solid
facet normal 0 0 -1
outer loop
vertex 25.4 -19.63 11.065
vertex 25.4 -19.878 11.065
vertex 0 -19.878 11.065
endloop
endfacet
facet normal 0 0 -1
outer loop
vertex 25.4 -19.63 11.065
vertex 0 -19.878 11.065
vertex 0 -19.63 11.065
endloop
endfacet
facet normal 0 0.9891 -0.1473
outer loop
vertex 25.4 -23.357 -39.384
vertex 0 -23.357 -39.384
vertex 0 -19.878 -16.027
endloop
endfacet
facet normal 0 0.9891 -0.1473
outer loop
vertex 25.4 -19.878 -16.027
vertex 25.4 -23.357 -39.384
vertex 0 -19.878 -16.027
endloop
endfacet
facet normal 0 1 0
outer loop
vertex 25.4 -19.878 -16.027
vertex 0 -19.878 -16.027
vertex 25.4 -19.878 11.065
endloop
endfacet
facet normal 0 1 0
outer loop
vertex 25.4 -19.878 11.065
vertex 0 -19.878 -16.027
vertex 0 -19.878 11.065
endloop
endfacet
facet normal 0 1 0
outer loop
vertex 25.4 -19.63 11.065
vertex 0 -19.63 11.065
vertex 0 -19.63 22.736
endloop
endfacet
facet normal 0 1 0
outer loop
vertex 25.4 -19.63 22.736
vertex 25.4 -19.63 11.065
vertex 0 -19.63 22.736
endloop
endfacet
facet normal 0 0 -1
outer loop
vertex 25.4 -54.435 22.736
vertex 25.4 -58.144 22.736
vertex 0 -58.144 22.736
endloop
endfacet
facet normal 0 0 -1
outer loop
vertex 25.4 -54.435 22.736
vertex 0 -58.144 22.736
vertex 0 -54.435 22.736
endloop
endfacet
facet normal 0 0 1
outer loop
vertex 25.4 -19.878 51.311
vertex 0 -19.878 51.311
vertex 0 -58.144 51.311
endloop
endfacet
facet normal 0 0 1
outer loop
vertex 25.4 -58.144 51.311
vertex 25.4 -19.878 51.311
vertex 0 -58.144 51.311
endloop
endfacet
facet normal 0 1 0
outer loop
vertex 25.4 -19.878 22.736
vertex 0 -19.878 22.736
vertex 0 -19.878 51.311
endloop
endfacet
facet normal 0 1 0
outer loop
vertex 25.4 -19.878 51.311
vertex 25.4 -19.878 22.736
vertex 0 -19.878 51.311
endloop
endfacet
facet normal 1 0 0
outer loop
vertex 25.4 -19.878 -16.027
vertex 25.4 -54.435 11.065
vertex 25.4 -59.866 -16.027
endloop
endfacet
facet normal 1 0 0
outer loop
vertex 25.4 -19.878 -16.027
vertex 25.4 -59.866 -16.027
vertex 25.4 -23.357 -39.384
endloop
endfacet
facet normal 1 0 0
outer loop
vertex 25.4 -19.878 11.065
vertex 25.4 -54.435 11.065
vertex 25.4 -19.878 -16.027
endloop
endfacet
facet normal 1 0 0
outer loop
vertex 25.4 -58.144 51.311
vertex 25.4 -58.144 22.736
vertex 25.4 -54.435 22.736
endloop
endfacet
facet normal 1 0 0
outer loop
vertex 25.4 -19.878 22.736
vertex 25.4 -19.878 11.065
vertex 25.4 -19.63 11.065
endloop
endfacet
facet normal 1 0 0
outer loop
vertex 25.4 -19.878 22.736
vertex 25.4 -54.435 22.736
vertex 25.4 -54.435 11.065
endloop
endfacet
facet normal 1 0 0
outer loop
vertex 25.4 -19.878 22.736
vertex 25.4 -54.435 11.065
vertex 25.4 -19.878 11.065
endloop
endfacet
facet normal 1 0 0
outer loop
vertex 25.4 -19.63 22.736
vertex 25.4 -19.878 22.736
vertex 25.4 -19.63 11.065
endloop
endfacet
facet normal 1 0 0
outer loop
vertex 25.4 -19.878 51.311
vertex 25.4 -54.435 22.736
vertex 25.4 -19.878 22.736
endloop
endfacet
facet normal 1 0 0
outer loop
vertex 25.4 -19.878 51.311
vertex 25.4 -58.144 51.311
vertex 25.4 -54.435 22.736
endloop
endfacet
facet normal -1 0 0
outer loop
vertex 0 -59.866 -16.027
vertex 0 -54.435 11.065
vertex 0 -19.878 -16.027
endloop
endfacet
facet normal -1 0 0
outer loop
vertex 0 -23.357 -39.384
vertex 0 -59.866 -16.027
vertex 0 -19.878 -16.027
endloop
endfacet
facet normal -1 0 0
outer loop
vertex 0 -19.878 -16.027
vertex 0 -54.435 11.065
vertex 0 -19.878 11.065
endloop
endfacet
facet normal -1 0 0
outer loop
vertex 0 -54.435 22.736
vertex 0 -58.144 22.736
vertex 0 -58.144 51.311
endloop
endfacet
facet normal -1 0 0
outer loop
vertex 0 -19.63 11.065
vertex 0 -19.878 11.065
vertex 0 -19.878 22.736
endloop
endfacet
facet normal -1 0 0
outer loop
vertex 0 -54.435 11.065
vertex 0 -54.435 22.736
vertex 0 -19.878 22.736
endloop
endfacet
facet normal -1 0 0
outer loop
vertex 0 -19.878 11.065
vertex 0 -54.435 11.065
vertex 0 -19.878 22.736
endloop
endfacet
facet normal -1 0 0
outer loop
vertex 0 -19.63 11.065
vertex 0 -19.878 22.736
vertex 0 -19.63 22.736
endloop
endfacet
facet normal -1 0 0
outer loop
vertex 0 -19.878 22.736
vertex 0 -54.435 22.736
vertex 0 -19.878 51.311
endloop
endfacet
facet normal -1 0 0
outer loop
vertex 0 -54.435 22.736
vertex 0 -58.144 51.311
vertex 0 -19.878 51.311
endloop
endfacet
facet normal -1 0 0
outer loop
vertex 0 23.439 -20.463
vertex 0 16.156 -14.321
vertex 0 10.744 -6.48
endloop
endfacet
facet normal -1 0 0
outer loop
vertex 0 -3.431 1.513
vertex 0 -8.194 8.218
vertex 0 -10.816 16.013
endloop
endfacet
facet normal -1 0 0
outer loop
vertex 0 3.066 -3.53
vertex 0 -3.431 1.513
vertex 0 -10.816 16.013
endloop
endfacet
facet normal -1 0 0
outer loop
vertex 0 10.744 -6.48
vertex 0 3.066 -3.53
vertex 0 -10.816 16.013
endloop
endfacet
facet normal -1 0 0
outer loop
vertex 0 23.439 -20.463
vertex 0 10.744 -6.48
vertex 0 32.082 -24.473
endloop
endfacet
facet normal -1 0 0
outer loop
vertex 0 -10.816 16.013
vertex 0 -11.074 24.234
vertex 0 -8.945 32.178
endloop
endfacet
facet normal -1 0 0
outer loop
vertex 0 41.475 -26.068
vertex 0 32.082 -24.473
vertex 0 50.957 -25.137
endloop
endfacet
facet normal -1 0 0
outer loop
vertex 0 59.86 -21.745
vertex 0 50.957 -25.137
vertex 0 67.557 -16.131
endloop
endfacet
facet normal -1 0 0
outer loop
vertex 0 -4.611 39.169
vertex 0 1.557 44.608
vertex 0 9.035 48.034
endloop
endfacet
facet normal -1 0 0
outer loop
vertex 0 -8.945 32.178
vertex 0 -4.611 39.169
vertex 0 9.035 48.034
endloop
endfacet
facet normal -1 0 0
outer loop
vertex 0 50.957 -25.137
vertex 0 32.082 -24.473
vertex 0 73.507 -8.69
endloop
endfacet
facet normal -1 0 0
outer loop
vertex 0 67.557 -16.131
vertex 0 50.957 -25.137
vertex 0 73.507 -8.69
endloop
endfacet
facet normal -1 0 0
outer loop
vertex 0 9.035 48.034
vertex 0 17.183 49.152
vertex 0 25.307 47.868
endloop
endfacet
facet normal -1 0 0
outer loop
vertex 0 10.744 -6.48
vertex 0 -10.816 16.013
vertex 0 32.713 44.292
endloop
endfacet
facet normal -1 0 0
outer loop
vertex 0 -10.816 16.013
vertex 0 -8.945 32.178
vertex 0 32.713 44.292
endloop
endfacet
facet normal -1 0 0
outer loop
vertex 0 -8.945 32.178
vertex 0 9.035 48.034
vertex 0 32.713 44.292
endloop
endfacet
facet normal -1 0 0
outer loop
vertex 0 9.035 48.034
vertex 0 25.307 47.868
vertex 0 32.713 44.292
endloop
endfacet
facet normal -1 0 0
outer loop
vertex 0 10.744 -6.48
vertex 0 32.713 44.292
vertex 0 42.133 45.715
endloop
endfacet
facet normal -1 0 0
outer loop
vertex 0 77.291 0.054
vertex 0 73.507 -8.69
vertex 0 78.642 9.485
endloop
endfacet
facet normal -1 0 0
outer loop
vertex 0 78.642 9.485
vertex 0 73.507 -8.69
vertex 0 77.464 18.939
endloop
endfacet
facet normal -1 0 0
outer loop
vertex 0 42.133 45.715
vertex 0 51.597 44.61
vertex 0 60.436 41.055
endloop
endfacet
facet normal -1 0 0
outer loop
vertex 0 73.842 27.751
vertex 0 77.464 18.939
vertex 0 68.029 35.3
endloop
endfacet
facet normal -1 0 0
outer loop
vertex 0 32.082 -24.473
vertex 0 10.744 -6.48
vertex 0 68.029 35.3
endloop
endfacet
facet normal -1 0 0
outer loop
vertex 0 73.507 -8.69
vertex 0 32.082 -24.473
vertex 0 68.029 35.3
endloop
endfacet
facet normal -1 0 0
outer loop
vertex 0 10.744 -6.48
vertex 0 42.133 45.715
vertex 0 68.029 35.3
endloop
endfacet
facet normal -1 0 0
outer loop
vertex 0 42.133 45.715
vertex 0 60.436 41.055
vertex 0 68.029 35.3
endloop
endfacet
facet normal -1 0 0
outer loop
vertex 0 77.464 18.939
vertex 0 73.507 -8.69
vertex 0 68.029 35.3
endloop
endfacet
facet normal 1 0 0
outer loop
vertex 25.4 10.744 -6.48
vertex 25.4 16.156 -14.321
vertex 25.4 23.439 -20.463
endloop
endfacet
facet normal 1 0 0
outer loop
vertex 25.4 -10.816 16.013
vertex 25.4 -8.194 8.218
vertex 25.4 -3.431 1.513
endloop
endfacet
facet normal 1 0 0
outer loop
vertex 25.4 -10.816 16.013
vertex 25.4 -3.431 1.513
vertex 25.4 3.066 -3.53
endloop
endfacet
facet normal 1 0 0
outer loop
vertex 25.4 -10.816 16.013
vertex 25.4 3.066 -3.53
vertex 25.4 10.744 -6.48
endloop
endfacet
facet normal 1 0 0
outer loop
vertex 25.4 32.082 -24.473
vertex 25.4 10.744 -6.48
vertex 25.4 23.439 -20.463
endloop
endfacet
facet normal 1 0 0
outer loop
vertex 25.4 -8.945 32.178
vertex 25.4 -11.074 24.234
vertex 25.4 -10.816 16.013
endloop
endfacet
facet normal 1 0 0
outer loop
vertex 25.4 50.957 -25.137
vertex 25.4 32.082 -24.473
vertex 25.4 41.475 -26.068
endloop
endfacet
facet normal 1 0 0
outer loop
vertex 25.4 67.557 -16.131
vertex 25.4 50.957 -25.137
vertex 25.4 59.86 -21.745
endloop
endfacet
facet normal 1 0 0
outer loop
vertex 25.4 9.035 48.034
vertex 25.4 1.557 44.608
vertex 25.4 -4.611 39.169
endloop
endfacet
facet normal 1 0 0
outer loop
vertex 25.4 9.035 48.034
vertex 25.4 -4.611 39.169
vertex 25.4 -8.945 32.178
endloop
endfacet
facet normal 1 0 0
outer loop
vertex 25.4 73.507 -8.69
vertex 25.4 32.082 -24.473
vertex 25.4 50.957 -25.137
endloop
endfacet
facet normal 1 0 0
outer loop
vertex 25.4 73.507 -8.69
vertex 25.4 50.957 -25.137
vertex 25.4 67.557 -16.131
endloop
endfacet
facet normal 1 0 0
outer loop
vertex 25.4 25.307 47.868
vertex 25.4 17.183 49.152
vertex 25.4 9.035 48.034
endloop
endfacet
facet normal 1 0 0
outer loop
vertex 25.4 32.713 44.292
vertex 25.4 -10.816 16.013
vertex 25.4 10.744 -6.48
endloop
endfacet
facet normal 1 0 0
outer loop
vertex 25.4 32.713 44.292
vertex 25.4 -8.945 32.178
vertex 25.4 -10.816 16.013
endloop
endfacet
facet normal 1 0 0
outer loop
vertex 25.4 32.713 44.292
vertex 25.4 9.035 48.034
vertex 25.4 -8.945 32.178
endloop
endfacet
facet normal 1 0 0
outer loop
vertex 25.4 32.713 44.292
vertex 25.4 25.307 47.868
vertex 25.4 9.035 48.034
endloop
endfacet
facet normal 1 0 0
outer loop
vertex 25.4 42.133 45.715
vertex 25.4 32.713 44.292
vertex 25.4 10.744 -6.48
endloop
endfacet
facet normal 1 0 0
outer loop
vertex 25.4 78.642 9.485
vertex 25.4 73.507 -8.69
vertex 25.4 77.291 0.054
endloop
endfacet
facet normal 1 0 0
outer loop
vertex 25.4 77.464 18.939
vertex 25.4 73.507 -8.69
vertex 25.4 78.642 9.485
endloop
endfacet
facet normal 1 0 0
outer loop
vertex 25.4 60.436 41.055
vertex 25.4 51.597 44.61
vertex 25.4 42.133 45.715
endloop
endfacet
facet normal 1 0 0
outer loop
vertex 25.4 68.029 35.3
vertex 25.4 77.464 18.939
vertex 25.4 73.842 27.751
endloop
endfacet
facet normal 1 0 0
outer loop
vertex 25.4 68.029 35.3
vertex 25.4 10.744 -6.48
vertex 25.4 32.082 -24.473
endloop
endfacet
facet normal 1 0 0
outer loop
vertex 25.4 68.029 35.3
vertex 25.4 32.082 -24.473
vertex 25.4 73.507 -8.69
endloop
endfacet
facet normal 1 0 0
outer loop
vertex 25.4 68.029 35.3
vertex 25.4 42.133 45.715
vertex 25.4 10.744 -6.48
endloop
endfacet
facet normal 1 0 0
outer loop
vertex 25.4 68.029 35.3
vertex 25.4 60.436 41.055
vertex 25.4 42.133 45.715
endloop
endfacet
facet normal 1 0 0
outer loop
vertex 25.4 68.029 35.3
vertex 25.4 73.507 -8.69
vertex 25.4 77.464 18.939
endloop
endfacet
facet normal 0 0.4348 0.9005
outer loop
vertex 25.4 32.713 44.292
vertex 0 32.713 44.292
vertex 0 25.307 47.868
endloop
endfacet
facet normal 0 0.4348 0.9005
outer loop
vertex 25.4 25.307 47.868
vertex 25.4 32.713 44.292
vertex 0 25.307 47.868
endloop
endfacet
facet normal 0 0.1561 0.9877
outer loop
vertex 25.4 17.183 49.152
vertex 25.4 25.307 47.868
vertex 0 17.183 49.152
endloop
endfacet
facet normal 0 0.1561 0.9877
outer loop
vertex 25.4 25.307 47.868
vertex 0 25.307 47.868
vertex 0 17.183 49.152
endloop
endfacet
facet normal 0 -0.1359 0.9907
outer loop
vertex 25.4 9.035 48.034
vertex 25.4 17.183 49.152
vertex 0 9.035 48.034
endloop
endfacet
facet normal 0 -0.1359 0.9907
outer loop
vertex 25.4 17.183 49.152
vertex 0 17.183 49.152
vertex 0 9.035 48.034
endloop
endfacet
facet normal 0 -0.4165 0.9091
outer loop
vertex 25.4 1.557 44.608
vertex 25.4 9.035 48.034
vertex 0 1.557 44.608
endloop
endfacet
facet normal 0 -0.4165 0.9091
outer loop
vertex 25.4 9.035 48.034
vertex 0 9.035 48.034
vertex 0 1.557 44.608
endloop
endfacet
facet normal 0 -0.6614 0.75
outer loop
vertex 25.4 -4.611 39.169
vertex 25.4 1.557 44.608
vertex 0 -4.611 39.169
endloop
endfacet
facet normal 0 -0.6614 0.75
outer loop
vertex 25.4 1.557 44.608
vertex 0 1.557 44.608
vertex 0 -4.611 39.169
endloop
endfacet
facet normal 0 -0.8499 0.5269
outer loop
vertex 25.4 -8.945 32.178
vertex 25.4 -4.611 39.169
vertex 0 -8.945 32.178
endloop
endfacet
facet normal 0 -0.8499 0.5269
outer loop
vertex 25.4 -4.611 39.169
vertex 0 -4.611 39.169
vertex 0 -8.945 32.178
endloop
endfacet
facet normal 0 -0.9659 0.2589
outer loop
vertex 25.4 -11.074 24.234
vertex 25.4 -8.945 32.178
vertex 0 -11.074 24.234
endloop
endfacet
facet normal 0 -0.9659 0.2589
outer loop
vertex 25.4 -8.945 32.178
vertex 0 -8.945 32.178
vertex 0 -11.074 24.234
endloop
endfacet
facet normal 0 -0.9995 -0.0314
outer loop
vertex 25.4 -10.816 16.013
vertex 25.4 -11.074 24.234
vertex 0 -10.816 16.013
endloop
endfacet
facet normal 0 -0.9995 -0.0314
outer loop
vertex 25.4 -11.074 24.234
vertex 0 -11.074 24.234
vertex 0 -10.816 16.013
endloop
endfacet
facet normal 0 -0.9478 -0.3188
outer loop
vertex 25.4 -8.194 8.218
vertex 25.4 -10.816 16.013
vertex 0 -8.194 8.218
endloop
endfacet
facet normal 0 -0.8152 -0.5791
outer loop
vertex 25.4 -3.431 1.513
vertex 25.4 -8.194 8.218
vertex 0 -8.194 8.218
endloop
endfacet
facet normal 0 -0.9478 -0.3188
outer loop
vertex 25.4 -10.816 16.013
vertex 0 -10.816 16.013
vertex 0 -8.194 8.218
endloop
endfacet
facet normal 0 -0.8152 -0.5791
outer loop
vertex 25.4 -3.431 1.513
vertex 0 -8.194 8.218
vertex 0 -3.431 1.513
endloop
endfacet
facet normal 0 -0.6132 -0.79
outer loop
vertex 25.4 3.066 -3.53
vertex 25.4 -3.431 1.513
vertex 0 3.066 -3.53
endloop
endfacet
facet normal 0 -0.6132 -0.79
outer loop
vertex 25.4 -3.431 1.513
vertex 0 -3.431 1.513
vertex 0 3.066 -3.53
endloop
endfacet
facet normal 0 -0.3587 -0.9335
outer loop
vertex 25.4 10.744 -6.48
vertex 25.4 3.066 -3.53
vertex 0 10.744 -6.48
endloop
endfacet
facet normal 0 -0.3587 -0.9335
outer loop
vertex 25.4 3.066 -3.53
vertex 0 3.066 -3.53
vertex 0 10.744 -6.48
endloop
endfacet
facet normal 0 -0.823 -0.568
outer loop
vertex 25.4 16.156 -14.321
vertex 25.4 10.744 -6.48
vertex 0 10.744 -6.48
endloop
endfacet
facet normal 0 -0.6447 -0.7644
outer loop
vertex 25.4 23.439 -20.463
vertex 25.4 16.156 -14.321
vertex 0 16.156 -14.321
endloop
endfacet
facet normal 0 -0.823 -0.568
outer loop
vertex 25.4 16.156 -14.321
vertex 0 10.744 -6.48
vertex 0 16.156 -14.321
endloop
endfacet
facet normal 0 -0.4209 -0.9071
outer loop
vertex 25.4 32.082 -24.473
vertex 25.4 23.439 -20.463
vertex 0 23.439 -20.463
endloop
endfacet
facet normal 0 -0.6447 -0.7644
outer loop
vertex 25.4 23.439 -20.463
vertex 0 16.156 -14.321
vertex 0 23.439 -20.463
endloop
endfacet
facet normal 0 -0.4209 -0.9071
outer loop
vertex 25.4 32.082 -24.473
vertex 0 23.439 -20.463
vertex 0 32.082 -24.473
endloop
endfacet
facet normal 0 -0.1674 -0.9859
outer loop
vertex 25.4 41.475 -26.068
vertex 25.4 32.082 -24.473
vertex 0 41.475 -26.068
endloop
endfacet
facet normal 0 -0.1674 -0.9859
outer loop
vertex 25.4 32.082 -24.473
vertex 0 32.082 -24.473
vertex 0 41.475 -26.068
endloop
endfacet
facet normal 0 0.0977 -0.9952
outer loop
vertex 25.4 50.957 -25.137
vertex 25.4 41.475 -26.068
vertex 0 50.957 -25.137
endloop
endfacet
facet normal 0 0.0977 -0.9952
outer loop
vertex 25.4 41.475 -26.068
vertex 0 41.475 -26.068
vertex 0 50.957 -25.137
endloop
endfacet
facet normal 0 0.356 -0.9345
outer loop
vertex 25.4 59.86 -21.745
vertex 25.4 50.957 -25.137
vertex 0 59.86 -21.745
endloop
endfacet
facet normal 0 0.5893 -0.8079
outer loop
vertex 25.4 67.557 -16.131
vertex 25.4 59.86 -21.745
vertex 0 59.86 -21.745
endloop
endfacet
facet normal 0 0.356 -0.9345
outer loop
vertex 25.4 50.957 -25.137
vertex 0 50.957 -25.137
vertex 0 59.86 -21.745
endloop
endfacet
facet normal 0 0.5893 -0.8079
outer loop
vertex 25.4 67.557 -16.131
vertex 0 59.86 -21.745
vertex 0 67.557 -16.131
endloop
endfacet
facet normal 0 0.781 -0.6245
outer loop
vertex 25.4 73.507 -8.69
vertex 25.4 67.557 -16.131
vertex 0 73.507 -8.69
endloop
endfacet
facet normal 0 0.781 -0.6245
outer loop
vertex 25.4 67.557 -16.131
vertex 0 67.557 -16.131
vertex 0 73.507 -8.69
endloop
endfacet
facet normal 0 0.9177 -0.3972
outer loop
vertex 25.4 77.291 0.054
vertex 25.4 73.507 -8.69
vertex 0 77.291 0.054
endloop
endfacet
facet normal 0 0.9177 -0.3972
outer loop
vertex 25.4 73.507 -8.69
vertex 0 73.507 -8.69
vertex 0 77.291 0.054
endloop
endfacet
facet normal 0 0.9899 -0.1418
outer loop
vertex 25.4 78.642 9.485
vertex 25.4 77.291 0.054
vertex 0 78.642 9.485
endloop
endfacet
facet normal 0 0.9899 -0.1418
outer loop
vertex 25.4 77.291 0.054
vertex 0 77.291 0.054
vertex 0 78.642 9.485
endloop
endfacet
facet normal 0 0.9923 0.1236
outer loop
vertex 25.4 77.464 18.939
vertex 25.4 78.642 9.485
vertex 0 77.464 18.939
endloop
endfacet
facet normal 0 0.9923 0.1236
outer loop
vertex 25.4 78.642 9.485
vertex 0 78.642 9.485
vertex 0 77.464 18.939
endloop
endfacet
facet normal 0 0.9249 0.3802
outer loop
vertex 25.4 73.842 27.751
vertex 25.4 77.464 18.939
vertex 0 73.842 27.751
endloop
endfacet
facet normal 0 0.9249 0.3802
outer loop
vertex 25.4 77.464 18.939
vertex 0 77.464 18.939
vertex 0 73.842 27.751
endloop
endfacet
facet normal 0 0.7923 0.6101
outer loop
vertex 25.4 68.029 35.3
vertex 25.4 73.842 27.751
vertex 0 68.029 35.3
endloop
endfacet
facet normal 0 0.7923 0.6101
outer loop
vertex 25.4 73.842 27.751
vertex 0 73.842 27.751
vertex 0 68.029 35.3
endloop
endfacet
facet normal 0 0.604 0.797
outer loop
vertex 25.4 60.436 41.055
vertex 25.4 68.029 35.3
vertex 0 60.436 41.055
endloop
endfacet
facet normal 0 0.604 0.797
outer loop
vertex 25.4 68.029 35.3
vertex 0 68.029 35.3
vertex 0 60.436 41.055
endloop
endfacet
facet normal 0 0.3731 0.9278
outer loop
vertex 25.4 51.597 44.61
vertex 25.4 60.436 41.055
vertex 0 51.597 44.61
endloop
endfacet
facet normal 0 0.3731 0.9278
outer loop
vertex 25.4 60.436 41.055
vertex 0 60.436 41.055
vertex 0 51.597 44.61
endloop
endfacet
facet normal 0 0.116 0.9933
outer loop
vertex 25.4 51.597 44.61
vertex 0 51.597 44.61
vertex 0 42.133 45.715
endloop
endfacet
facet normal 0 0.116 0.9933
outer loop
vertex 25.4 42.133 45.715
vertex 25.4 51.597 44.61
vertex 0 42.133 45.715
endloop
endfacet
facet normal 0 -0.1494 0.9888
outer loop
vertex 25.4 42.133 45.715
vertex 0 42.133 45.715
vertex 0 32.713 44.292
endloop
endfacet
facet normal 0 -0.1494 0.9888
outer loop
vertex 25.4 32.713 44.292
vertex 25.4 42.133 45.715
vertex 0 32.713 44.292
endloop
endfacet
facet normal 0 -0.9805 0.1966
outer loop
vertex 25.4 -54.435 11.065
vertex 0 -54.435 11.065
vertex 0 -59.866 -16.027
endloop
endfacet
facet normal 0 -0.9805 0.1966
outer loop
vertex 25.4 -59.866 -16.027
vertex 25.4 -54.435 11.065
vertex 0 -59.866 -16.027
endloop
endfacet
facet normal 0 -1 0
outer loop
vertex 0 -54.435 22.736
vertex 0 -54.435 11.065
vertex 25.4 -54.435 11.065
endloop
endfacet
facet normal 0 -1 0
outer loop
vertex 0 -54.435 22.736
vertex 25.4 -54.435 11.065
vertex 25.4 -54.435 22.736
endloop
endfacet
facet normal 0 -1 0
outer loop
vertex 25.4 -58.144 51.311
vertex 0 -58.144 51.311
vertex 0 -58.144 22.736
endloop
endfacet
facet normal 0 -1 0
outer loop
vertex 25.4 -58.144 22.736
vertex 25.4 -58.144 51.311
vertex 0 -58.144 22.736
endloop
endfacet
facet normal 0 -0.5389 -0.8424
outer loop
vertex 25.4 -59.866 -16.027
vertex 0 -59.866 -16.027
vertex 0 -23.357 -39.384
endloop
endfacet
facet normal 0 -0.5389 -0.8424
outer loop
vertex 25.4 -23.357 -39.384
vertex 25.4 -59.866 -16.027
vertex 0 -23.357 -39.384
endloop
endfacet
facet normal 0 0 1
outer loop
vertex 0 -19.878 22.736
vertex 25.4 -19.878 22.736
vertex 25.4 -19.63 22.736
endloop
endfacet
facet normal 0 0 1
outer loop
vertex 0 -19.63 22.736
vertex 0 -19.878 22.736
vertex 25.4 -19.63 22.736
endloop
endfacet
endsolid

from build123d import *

# Parameters (mm, degrees)
F0_W     = 0.2484787256
F0_H     = 11.6704234847
F0_W_2   = 34.5566543078
F1_DEPTH = 25.4


with BuildPart() as f1:
    # F0 (on Right) → F1 (new body)
    with BuildSketch(Plane.YZ):
        with Locations((-19.7540214285, 16.9005497362)):
            Rectangle(F0_W, F0_H)
        Polygon((-19.8782607913, -16.0268489271), (-59.8657472271, -16.0268489271), (-23.3569573611, -39.3838062882), align=None)
        Polygon((-58.1439137459, 22.7357614785), (-54.4349150991, 22.7357614785), (-19.8782607913, 22.7357614785), (-19.8782607913, 51.3107590377), (-58.1439137459, 51.3107590377), align=None)
        Polygon((-54.4349150991, 11.0653379939), (-56.6530451179, 0), (-19.8782607913, 0), (-19.8782607913, 11.0653379939), align=None)
        Polygon((-19.8782607913, 0), (-56.6530451179, 0), (-59.8657472271, -16.0268489271), (-19.8782607913, -16.0268489271), align=None)
        with Locations((-37.1565879452, 16.9005497362)):
            Rectangle(F0_W_2, F0_H)
    extrude(amount=F1_DEPTH)


with BuildPart() as f1b:
    # F0 (on Right) → F1, piece 2 (new body)
    with BuildSketch(Plane.YZ):
        with BuildLine():
            ThreePointArc((10.7435146003, -6.4801681734), (9.7857196096, 24.0733109393), (32.7128486809, 44.2915999293))
            ThreePointArc((32.7128486809, 44.2915999293), (-8.945073617, 32.1782690562), (10.7435146003, -6.4801681734))
        make_face()
        with BuildLine():
            ThreePointArc((32.7128486809, 44.2915999293), (41.7778779667, 34.1774621992), (45.0536161334, 20.9964122623))
            ThreePointArc((45.0536161334, 20.9964122623), (34.4972484633, -0.9816764834), (10.7435146003, -6.4801681734))
            ThreePointArc((10.7435146003, -6.4801681734), (51.1168044711, -25.0991981896), (78.6431667306, 9.8145554684))
            ThreePointArc((78.6431667306, 9.8145554684), (64.2928709887, 38.5297984193), (32.7128486809, 44.2915999293))
        make_face()
        with BuildLine():
            ThreePointArc((10.7435146003, -6.4801681734), (34.4972484633, -0.9816764834), (45.0536161334, 20.9964122623))
            ThreePointArc((45.0536161334, 20.9964122623), (41.7778779667, 34.1774621992), (32.7128486809, 44.2915999293))
            ThreePointArc((32.7128486809, 44.2915999293), (9.7857196096, 24.0733109393), (10.7435146003, -6.4801681734))
        make_face()
    extrude(amount=F1_DEPTH)


solid = Compound([f1.part, f1b.part])
